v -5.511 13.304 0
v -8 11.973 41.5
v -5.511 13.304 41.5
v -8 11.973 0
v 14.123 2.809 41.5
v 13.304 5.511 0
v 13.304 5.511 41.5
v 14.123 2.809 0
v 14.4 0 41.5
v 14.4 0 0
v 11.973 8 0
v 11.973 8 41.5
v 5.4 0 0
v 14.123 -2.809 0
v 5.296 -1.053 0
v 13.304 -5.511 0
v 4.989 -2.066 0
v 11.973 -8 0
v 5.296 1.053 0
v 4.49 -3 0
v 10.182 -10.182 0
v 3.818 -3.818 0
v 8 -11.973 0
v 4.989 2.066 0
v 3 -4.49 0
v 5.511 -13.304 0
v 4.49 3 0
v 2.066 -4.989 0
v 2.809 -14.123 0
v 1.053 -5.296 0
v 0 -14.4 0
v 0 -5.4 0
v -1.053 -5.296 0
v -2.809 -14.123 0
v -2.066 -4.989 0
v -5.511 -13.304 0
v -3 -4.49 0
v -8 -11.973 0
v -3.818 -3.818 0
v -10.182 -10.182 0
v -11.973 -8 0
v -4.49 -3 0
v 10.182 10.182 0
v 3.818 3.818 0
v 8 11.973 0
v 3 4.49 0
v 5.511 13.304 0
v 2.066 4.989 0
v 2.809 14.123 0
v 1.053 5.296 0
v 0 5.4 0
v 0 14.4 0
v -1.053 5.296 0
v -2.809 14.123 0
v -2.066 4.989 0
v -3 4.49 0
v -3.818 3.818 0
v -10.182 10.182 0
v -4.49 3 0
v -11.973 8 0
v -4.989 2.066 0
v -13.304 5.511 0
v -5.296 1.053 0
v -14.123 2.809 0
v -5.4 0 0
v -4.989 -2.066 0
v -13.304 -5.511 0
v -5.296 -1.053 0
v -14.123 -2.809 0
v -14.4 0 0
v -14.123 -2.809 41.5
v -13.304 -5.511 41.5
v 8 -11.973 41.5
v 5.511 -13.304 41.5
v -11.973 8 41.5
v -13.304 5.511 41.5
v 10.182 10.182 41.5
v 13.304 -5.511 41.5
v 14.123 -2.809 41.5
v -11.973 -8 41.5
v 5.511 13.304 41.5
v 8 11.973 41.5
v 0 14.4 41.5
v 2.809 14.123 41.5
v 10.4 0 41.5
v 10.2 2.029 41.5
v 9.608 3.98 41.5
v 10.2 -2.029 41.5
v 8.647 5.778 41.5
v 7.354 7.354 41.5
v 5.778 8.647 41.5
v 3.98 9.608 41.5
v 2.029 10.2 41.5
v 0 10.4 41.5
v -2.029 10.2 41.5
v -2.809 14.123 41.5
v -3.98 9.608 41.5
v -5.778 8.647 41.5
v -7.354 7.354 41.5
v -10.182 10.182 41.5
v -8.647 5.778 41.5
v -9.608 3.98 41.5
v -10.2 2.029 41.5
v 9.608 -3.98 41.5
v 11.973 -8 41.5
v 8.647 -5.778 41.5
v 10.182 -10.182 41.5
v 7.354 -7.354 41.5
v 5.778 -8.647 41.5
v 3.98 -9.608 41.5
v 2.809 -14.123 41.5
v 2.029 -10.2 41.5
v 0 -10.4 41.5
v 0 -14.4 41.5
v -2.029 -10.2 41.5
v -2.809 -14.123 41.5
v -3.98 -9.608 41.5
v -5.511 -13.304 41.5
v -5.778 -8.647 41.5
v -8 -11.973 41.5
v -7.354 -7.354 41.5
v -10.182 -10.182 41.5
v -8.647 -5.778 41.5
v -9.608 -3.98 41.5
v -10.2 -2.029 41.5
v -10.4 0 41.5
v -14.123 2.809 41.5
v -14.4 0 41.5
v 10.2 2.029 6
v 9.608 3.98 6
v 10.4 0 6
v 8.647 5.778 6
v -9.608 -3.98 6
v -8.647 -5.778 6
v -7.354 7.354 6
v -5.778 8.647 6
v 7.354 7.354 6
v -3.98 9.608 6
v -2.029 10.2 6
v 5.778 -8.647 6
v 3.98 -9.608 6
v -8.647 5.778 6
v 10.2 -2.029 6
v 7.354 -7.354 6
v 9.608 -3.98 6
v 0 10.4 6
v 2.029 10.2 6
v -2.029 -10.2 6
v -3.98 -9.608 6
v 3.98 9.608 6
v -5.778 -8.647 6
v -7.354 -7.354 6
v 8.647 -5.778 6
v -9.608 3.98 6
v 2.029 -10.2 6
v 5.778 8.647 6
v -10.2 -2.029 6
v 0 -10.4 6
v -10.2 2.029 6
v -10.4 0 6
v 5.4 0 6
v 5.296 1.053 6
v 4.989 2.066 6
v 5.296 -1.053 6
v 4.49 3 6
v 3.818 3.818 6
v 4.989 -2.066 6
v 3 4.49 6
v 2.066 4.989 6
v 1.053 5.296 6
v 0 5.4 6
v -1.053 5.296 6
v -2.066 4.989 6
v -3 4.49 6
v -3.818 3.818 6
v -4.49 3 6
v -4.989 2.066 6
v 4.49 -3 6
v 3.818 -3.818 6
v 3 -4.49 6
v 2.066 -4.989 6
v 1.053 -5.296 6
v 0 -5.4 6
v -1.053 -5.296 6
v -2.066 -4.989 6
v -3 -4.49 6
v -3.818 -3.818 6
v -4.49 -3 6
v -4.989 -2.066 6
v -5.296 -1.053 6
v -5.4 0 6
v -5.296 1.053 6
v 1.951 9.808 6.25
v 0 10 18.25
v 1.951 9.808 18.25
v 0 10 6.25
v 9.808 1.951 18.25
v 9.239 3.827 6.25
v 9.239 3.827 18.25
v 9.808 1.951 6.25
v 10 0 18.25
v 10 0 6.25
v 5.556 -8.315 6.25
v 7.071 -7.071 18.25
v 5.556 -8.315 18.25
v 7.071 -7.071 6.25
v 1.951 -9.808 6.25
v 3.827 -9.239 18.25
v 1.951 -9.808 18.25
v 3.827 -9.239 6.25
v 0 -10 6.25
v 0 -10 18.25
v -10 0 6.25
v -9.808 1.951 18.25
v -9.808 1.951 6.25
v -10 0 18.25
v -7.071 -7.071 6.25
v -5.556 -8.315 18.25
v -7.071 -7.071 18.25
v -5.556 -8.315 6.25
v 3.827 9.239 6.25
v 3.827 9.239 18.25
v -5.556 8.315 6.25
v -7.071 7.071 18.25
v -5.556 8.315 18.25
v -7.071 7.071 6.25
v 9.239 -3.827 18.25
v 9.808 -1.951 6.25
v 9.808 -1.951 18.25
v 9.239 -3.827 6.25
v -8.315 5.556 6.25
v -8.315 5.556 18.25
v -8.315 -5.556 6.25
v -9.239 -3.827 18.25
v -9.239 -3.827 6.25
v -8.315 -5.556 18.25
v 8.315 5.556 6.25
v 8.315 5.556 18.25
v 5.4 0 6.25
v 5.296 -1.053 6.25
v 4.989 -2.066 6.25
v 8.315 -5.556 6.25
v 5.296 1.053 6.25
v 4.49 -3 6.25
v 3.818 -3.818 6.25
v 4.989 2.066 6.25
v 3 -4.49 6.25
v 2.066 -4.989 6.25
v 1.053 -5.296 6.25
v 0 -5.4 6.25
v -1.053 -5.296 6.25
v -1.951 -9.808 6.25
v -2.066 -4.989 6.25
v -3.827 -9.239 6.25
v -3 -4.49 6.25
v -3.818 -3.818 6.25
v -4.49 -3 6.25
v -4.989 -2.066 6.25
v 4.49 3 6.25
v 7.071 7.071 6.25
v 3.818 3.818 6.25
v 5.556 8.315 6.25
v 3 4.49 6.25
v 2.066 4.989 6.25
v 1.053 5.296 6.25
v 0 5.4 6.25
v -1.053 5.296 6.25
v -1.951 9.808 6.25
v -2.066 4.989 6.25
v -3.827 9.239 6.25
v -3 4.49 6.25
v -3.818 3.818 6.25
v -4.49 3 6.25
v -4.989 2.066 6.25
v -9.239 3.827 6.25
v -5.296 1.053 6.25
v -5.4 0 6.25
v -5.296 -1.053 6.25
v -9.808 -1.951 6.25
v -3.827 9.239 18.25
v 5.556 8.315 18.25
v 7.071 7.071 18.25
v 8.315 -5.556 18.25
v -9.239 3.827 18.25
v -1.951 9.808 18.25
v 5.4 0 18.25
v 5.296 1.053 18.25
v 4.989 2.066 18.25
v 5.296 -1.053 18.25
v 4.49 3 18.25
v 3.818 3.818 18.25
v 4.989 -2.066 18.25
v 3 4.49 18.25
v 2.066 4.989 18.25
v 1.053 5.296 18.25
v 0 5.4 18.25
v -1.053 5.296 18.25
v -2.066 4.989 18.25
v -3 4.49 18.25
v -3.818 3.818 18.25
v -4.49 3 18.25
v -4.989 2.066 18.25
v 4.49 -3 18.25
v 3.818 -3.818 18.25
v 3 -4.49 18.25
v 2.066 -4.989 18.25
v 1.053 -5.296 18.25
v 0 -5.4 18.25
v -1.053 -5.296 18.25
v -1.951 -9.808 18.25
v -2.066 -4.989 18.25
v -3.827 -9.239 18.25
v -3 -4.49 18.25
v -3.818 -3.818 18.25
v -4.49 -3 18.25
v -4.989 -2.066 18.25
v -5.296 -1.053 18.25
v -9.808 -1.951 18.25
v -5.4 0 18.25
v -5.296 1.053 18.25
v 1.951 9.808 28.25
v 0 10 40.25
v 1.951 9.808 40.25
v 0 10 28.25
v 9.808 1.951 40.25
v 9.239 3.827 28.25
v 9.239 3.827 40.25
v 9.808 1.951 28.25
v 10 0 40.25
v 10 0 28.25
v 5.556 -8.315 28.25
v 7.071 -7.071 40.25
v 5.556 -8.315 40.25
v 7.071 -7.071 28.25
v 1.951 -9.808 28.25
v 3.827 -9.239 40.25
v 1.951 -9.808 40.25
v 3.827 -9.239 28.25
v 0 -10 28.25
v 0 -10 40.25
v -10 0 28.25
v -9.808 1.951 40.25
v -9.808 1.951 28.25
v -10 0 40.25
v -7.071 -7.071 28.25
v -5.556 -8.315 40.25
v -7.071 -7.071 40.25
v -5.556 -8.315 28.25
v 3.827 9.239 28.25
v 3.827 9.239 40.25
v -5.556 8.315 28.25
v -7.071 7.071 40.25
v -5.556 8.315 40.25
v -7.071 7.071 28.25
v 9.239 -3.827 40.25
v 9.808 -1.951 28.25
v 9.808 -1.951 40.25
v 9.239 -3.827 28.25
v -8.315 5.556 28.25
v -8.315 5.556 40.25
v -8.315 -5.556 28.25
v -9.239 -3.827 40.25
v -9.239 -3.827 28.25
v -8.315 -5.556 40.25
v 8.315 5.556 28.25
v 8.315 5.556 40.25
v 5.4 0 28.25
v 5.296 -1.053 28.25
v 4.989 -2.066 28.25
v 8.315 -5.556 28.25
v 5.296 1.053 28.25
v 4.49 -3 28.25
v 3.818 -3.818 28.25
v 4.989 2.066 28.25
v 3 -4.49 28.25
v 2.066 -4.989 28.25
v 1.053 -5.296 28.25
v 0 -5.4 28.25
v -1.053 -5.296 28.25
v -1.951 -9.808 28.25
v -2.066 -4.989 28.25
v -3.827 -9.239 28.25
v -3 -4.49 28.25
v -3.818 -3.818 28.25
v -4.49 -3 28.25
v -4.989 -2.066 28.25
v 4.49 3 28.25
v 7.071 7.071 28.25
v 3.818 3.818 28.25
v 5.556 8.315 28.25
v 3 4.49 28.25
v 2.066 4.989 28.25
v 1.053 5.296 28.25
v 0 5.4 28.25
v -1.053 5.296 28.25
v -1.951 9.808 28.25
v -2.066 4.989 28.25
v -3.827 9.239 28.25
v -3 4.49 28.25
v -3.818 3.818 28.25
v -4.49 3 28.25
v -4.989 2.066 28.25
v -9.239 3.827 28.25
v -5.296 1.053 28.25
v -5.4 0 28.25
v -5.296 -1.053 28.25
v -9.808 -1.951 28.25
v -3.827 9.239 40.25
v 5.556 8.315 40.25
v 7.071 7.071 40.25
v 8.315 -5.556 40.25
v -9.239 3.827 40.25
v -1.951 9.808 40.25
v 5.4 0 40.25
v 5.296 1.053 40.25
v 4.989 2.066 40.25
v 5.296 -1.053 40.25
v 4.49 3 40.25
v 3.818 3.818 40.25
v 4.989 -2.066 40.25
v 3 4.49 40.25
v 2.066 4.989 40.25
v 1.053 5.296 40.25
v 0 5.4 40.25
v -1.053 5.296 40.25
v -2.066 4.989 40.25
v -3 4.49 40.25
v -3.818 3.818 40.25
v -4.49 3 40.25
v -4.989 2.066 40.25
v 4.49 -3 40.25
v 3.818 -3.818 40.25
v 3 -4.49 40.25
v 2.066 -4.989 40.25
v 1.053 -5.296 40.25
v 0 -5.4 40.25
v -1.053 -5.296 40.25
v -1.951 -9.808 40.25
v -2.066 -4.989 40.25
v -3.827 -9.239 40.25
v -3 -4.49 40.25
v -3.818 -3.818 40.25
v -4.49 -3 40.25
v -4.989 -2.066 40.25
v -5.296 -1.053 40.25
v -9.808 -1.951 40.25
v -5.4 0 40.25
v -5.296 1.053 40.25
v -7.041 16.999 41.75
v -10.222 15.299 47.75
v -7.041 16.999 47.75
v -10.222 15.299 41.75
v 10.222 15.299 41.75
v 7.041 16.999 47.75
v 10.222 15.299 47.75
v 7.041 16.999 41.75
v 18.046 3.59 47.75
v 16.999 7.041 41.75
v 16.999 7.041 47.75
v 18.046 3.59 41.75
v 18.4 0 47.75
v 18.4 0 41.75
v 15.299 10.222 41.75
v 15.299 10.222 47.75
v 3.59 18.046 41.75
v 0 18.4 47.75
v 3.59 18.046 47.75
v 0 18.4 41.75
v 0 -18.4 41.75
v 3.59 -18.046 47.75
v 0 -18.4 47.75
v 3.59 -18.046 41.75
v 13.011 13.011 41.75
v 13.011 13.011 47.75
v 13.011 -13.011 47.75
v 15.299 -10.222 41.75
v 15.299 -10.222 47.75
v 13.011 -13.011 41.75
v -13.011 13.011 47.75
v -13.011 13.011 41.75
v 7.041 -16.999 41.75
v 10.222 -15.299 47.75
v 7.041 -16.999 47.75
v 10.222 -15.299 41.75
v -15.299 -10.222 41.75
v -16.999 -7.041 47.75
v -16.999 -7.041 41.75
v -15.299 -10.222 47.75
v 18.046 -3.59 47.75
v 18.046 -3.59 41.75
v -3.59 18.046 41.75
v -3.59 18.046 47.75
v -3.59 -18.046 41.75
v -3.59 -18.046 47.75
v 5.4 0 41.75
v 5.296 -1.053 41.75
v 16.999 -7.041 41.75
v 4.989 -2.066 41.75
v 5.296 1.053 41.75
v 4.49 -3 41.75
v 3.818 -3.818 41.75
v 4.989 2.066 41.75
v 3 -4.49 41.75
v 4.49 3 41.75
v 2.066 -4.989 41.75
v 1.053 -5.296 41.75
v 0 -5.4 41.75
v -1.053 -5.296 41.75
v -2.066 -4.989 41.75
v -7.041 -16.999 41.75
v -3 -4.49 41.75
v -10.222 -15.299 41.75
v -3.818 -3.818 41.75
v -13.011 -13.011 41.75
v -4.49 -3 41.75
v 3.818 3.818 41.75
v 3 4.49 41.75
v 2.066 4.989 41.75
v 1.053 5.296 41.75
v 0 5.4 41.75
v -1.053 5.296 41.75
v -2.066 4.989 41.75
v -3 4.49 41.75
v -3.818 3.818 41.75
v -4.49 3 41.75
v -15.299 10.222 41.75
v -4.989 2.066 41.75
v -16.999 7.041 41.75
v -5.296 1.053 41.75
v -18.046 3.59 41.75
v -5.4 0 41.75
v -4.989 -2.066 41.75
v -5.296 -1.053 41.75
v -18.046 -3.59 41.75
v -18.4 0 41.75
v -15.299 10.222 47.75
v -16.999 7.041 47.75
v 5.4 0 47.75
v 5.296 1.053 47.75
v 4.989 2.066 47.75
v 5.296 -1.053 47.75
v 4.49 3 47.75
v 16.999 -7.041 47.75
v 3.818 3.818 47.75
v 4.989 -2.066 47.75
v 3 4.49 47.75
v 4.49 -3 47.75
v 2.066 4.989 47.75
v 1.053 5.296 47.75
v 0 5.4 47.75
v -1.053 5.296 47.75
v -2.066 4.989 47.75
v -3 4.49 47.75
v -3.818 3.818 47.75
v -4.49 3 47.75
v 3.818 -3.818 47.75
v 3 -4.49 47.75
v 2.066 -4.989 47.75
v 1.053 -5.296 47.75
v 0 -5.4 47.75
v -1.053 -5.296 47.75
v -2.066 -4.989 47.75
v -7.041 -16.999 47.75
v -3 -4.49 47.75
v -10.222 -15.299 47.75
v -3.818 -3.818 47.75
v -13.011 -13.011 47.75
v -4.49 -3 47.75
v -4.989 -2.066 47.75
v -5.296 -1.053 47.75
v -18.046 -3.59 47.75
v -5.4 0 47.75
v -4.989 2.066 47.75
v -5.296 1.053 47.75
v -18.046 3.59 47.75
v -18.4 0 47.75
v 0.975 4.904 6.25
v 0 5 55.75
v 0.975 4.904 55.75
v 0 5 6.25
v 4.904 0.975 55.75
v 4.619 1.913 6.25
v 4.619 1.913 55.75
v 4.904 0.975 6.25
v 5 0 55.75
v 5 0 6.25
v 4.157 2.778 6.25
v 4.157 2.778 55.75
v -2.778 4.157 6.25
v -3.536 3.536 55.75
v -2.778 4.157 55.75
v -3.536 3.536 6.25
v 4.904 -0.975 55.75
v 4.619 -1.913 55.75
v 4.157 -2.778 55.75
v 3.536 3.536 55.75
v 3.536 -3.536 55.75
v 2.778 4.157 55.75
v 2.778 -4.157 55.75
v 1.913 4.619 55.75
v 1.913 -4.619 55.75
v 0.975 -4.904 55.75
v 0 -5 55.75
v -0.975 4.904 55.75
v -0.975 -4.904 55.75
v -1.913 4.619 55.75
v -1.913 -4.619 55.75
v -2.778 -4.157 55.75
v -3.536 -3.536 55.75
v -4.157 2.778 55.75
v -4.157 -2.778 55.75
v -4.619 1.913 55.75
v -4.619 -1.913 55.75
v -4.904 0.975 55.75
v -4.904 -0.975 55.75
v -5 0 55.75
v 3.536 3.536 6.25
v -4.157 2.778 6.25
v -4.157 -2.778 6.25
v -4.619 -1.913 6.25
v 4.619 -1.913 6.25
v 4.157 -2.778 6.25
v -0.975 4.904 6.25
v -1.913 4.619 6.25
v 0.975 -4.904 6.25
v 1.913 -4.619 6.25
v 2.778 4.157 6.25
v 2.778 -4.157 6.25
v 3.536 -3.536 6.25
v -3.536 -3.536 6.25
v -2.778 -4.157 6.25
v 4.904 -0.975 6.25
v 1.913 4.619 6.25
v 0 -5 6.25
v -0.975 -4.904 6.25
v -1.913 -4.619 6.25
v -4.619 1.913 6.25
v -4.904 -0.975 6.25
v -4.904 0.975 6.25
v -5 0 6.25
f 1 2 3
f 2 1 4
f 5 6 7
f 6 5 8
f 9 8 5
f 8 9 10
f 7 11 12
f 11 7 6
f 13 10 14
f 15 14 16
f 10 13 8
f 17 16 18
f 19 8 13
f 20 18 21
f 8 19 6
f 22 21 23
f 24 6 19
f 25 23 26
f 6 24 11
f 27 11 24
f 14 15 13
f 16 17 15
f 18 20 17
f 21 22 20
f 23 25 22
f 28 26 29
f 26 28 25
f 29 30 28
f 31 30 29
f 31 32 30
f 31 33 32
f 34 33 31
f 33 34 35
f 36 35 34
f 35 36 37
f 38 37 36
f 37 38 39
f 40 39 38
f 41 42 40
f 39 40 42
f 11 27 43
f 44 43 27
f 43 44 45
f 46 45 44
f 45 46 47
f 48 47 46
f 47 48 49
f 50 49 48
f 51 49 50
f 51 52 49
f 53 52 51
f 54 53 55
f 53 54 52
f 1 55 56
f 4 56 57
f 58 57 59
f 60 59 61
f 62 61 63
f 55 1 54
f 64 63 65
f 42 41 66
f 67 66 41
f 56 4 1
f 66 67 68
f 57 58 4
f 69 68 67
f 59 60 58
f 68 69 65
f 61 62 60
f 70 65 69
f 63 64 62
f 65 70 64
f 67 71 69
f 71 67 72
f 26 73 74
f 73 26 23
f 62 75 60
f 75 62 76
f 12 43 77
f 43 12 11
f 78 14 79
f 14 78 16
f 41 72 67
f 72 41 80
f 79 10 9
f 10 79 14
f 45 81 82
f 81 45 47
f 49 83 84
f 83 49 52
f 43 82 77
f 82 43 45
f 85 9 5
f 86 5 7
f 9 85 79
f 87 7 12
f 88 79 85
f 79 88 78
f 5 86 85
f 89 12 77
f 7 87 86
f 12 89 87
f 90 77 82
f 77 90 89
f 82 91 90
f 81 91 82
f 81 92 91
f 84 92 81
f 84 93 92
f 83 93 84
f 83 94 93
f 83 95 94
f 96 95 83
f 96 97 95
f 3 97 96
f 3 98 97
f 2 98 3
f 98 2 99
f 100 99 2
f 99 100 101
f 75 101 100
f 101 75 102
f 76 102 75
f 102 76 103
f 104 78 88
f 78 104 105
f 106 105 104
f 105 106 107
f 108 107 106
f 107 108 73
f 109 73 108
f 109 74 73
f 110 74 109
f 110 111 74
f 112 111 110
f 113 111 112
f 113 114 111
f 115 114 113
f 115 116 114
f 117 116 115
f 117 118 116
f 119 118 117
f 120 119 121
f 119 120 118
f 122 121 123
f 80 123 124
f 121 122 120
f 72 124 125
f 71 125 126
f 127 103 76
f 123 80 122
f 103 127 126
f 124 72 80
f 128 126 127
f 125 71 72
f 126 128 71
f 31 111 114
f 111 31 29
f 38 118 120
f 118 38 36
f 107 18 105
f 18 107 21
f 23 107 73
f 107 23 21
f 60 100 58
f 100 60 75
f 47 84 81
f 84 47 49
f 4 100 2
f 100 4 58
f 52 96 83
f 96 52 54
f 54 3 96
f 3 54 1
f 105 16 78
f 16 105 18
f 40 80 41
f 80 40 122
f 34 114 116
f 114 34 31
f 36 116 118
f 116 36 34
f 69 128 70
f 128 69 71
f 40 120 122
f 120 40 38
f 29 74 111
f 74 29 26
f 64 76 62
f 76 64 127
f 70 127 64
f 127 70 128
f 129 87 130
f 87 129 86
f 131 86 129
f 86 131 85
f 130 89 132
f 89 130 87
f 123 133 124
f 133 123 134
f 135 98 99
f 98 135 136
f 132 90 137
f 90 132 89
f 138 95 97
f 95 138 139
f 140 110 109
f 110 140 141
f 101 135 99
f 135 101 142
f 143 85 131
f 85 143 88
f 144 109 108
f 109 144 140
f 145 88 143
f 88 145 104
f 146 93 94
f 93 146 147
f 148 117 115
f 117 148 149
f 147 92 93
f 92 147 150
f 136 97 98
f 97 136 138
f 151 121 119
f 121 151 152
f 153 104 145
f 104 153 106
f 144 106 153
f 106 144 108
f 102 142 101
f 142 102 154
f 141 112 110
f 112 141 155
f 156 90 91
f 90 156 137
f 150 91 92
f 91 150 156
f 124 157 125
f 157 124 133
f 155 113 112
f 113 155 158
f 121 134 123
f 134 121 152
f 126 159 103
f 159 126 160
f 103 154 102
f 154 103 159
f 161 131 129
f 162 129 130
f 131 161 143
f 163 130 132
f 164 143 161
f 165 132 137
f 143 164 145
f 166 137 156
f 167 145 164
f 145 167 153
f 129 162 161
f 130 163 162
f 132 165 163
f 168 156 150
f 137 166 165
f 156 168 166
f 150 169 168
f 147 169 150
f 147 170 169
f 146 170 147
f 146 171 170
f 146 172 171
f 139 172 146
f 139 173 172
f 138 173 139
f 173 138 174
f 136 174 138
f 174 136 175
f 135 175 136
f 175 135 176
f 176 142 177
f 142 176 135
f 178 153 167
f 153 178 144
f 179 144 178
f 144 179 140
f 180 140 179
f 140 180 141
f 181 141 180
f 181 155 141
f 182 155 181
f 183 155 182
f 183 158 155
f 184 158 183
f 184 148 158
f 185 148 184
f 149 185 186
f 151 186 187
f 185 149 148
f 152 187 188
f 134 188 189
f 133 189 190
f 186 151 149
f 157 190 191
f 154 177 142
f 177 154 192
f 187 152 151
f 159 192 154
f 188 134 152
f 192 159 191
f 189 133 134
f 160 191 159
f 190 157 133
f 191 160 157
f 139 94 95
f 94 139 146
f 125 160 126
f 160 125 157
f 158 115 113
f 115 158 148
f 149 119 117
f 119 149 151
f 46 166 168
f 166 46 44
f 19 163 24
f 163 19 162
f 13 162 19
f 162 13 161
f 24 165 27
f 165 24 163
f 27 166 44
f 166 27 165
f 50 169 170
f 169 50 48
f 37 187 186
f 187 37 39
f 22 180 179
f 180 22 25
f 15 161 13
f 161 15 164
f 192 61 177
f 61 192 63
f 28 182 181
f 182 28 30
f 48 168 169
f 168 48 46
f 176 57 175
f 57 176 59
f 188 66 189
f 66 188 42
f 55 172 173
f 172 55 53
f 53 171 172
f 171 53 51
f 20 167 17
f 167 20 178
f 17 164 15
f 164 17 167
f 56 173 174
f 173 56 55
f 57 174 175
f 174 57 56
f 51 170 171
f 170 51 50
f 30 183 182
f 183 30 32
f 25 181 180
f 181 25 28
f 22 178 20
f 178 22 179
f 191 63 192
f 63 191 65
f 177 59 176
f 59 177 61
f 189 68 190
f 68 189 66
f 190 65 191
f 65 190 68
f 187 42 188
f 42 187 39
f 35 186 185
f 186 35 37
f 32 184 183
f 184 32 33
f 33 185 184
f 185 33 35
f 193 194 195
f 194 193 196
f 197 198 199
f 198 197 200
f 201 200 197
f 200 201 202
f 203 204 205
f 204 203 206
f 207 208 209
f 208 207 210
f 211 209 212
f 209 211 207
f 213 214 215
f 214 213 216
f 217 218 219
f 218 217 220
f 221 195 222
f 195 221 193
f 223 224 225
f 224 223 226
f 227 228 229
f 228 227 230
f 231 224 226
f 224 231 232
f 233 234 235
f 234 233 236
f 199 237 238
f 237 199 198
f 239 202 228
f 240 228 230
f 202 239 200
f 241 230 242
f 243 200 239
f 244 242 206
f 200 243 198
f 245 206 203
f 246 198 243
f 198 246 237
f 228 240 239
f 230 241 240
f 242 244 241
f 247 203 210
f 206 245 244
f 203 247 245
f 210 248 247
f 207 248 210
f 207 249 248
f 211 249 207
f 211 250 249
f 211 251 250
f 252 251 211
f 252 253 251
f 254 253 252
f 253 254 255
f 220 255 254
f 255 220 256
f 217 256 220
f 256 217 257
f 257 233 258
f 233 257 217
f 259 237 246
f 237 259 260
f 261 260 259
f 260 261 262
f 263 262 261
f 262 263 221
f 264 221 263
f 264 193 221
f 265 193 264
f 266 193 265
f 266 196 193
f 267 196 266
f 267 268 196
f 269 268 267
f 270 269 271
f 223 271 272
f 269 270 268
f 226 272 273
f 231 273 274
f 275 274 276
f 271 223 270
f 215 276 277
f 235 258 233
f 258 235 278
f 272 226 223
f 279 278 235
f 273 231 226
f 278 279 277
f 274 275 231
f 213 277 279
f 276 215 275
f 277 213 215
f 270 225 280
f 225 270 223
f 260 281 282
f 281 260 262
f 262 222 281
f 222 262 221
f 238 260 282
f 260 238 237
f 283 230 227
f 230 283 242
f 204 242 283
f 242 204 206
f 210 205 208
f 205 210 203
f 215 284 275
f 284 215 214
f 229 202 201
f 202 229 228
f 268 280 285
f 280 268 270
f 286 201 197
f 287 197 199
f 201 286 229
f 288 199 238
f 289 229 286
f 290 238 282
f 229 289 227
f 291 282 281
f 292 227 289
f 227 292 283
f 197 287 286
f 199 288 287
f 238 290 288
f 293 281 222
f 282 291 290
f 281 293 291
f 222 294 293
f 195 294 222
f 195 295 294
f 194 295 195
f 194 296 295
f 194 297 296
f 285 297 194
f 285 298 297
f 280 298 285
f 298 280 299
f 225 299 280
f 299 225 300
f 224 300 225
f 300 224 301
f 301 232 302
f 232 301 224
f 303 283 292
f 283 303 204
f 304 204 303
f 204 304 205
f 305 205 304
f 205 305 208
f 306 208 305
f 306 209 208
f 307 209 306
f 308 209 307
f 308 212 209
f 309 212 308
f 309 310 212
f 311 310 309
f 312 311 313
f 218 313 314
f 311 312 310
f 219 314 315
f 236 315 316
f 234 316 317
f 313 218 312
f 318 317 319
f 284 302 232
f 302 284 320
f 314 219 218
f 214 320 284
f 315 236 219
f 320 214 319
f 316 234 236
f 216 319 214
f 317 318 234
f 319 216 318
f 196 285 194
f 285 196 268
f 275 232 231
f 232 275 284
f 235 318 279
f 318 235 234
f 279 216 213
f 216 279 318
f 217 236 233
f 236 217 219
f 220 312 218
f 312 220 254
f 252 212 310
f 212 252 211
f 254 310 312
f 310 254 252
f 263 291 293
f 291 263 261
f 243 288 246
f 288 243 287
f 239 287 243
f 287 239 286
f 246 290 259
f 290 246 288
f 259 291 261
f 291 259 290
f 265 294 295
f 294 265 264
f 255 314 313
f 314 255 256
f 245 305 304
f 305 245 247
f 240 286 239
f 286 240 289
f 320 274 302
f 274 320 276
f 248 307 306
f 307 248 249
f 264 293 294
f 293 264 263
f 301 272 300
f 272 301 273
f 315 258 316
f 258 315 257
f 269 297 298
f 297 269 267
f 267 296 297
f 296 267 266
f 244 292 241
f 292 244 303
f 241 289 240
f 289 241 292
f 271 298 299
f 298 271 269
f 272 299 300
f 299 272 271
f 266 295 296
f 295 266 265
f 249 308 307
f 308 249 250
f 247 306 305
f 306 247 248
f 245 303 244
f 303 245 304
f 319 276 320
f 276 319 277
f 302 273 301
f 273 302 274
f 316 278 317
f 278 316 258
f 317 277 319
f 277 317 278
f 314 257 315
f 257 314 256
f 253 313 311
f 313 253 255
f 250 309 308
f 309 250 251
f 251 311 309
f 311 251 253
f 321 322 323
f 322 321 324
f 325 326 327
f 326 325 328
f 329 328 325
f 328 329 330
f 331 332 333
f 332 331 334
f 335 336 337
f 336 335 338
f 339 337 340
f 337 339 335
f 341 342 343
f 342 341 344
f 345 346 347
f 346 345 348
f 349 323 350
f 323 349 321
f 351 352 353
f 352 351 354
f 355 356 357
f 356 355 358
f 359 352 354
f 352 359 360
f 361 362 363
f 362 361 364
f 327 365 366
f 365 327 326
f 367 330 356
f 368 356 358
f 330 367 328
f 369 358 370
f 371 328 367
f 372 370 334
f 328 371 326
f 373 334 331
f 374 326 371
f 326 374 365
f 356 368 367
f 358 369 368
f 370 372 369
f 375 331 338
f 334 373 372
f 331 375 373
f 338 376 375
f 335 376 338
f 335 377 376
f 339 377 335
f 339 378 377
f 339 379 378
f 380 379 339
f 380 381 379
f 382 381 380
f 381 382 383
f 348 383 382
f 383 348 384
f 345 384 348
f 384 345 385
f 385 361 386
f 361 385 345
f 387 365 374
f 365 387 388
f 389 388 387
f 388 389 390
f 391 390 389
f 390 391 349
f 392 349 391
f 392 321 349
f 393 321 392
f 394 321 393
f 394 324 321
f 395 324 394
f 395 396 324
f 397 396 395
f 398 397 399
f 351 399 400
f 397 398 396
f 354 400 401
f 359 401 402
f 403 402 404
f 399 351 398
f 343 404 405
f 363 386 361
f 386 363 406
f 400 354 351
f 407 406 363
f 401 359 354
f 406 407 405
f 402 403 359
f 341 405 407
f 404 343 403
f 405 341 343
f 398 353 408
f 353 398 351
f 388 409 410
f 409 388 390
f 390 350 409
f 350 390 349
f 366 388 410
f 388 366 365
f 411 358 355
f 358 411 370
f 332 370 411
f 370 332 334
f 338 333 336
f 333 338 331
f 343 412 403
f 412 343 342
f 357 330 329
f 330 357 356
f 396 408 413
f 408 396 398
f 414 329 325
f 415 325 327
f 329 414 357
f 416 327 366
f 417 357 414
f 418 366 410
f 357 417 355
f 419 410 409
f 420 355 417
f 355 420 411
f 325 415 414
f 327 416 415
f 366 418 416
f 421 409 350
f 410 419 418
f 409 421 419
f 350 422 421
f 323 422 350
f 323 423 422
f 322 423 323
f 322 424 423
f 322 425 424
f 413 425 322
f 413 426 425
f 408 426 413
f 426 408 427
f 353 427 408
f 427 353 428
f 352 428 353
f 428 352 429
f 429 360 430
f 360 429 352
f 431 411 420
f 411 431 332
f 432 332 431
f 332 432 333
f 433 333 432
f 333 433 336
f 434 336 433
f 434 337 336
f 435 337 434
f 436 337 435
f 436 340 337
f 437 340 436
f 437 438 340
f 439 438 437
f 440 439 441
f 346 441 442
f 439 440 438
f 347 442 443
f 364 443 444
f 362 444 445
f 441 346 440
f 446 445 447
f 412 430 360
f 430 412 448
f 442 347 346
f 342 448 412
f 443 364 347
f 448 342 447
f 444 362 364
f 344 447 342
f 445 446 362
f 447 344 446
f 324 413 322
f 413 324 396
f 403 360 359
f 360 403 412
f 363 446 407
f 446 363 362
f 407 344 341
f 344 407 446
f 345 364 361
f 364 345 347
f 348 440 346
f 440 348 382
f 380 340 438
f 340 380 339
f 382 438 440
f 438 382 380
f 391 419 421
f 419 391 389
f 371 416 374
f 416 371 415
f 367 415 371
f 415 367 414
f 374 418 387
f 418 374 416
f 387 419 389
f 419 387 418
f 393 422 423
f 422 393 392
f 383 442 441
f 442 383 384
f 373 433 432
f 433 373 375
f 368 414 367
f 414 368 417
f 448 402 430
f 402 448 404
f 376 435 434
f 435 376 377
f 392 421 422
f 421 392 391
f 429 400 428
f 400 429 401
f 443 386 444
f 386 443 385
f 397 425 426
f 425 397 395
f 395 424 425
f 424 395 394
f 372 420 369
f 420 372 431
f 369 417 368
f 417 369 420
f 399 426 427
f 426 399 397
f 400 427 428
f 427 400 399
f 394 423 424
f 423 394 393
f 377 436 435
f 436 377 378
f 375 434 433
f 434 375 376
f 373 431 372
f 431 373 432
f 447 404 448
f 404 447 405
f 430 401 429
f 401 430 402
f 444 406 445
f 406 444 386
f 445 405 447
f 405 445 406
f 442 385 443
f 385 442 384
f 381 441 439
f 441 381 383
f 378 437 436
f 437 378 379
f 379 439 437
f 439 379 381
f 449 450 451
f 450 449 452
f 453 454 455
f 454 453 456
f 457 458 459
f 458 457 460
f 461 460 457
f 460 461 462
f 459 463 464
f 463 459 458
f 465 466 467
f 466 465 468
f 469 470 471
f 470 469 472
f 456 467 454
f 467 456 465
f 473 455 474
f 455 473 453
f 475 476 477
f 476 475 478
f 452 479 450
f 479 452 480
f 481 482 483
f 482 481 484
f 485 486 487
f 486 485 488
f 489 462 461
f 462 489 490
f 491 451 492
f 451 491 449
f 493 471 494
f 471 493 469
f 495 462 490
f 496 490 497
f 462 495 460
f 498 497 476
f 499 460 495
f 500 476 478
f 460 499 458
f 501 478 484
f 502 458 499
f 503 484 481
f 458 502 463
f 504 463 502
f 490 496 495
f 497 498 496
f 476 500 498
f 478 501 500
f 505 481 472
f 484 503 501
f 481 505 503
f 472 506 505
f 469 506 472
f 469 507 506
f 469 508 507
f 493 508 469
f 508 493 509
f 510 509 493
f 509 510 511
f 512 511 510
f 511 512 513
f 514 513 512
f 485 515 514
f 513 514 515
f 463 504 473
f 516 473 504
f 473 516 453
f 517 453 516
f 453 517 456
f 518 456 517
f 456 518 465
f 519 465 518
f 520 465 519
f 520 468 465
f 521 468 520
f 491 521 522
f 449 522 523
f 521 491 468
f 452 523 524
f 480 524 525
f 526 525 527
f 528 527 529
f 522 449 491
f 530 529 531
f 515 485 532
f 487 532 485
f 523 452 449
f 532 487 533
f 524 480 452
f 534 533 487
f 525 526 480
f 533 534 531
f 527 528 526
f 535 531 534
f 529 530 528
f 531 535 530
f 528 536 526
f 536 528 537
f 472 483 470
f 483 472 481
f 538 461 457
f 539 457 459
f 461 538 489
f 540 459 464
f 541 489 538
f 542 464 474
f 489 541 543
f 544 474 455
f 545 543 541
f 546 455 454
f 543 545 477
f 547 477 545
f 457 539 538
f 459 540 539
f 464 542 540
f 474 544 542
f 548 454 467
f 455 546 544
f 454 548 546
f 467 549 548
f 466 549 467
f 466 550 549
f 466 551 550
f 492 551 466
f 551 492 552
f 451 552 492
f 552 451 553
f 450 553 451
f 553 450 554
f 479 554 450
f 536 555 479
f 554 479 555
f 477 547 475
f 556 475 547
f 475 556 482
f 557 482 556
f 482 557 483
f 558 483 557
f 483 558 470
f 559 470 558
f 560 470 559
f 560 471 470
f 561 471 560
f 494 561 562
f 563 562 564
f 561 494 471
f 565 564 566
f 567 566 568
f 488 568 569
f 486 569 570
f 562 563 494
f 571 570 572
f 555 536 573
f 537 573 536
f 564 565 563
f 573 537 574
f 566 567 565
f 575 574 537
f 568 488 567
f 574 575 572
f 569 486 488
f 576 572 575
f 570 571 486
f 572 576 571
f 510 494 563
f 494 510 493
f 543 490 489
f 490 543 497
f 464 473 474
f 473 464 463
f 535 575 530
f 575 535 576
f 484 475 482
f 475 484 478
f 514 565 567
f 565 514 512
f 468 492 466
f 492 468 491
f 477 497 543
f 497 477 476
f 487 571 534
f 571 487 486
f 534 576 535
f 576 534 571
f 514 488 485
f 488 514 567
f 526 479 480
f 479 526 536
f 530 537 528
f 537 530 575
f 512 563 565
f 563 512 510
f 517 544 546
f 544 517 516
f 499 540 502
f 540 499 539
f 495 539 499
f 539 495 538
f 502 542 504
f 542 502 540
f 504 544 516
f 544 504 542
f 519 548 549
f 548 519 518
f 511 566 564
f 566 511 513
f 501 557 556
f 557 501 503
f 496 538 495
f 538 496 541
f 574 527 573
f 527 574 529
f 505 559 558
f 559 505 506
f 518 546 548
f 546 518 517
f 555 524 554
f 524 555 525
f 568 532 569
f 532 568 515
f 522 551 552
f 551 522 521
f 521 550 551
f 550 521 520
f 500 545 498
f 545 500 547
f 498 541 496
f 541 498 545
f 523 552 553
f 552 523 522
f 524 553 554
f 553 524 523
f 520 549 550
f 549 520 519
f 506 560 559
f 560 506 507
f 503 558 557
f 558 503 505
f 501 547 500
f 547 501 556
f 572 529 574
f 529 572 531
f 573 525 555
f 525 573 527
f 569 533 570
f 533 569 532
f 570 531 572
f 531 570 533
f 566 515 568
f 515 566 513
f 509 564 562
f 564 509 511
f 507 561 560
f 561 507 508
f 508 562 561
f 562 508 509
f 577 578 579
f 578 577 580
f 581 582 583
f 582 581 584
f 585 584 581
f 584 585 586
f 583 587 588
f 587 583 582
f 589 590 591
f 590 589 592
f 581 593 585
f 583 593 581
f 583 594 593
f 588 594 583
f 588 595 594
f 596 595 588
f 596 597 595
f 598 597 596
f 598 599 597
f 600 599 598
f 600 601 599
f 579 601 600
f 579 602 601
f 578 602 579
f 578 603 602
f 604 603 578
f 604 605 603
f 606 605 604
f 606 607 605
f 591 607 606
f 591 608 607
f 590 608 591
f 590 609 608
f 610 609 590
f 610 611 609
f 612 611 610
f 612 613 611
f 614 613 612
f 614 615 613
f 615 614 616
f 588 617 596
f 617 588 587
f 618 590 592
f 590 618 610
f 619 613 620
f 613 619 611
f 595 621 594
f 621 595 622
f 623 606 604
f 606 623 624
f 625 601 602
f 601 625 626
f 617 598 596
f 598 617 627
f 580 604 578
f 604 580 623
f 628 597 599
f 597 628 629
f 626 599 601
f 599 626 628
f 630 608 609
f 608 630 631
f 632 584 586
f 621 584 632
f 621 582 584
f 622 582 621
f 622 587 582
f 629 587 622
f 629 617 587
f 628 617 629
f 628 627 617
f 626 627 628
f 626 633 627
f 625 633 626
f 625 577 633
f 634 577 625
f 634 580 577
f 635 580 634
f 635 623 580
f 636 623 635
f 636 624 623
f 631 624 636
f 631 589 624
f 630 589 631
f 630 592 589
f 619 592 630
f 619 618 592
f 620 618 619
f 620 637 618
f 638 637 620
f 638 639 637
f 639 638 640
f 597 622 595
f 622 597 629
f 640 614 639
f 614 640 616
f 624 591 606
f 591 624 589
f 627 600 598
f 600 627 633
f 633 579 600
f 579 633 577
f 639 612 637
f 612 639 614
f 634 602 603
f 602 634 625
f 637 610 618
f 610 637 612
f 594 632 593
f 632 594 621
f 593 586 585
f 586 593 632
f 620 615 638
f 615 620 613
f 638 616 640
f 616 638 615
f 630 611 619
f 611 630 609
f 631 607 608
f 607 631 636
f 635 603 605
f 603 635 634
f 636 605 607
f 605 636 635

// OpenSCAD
$fn = 32;

// ------------------------------------------------------------------------
// Shaft station: cup d28.8 x 41.5 mm, shaft d10
// Every part is its own module, assembly() places every instance.
// ------------------------------------------------------------------------

// --- part 1 ---
module housing_cup() {
  difference() {
    cylinder(h = 41.5, d = 28.8);
    translate([0, 0, 6]) cylinder(h = 36.5, d = 20.8);
    translate([0, 0, -1]) cylinder(h = 8, d = 10.8);
  }
}

// --- part 2 ---
module bearing_lower() {
  difference() {
      translate([0, 0, 0]) cylinder(h = 12, d = 20);
      translate([0, 0, -1]) cylinder(h = 14, d = 10.8);
    }
}

// --- part 3 ---
module bearing_upper() {
  difference() {
      translate([0, 0, 0]) cylinder(h = 12, d = 20);
      translate([0, 0, -1]) cylinder(h = 14, d = 10.8);
    }
}

// --- part 4 ---
module station_shaft() {
  translate([0, 0, -24.75]) cylinder(h = 49.5, d = 10);
}

// --- part 5 ---
module station_cover() {
  difference() {
    cylinder(h = 6, d = 36.8);
    translate([0, 0, -1]) cylinder(h = 8, d = 10.8);
  }
}

// --- assembly ---
module assembly() {
  color([0.80, 0.24, 0.20]) translate([0, 0, 0]) rotate([0, 0, 0]) housing_cup();
  color([0.20, 0.45, 0.75]) translate([0, 0, 6.25]) rotate([0, 0, 0]) bearing_lower();
  color([0.25, 0.62, 0.32]) translate([0, 0, 28.25]) rotate([0, 0, 0]) bearing_upper();
  color([0.92, 0.70, 0.18]) translate([0, 0, 31]) rotate([0, 0, 0]) station_shaft();
  color([0.58, 0.35, 0.70]) translate([0, 0, 41.75]) rotate([0, 0, 0]) station_cover();
}

assembly();
